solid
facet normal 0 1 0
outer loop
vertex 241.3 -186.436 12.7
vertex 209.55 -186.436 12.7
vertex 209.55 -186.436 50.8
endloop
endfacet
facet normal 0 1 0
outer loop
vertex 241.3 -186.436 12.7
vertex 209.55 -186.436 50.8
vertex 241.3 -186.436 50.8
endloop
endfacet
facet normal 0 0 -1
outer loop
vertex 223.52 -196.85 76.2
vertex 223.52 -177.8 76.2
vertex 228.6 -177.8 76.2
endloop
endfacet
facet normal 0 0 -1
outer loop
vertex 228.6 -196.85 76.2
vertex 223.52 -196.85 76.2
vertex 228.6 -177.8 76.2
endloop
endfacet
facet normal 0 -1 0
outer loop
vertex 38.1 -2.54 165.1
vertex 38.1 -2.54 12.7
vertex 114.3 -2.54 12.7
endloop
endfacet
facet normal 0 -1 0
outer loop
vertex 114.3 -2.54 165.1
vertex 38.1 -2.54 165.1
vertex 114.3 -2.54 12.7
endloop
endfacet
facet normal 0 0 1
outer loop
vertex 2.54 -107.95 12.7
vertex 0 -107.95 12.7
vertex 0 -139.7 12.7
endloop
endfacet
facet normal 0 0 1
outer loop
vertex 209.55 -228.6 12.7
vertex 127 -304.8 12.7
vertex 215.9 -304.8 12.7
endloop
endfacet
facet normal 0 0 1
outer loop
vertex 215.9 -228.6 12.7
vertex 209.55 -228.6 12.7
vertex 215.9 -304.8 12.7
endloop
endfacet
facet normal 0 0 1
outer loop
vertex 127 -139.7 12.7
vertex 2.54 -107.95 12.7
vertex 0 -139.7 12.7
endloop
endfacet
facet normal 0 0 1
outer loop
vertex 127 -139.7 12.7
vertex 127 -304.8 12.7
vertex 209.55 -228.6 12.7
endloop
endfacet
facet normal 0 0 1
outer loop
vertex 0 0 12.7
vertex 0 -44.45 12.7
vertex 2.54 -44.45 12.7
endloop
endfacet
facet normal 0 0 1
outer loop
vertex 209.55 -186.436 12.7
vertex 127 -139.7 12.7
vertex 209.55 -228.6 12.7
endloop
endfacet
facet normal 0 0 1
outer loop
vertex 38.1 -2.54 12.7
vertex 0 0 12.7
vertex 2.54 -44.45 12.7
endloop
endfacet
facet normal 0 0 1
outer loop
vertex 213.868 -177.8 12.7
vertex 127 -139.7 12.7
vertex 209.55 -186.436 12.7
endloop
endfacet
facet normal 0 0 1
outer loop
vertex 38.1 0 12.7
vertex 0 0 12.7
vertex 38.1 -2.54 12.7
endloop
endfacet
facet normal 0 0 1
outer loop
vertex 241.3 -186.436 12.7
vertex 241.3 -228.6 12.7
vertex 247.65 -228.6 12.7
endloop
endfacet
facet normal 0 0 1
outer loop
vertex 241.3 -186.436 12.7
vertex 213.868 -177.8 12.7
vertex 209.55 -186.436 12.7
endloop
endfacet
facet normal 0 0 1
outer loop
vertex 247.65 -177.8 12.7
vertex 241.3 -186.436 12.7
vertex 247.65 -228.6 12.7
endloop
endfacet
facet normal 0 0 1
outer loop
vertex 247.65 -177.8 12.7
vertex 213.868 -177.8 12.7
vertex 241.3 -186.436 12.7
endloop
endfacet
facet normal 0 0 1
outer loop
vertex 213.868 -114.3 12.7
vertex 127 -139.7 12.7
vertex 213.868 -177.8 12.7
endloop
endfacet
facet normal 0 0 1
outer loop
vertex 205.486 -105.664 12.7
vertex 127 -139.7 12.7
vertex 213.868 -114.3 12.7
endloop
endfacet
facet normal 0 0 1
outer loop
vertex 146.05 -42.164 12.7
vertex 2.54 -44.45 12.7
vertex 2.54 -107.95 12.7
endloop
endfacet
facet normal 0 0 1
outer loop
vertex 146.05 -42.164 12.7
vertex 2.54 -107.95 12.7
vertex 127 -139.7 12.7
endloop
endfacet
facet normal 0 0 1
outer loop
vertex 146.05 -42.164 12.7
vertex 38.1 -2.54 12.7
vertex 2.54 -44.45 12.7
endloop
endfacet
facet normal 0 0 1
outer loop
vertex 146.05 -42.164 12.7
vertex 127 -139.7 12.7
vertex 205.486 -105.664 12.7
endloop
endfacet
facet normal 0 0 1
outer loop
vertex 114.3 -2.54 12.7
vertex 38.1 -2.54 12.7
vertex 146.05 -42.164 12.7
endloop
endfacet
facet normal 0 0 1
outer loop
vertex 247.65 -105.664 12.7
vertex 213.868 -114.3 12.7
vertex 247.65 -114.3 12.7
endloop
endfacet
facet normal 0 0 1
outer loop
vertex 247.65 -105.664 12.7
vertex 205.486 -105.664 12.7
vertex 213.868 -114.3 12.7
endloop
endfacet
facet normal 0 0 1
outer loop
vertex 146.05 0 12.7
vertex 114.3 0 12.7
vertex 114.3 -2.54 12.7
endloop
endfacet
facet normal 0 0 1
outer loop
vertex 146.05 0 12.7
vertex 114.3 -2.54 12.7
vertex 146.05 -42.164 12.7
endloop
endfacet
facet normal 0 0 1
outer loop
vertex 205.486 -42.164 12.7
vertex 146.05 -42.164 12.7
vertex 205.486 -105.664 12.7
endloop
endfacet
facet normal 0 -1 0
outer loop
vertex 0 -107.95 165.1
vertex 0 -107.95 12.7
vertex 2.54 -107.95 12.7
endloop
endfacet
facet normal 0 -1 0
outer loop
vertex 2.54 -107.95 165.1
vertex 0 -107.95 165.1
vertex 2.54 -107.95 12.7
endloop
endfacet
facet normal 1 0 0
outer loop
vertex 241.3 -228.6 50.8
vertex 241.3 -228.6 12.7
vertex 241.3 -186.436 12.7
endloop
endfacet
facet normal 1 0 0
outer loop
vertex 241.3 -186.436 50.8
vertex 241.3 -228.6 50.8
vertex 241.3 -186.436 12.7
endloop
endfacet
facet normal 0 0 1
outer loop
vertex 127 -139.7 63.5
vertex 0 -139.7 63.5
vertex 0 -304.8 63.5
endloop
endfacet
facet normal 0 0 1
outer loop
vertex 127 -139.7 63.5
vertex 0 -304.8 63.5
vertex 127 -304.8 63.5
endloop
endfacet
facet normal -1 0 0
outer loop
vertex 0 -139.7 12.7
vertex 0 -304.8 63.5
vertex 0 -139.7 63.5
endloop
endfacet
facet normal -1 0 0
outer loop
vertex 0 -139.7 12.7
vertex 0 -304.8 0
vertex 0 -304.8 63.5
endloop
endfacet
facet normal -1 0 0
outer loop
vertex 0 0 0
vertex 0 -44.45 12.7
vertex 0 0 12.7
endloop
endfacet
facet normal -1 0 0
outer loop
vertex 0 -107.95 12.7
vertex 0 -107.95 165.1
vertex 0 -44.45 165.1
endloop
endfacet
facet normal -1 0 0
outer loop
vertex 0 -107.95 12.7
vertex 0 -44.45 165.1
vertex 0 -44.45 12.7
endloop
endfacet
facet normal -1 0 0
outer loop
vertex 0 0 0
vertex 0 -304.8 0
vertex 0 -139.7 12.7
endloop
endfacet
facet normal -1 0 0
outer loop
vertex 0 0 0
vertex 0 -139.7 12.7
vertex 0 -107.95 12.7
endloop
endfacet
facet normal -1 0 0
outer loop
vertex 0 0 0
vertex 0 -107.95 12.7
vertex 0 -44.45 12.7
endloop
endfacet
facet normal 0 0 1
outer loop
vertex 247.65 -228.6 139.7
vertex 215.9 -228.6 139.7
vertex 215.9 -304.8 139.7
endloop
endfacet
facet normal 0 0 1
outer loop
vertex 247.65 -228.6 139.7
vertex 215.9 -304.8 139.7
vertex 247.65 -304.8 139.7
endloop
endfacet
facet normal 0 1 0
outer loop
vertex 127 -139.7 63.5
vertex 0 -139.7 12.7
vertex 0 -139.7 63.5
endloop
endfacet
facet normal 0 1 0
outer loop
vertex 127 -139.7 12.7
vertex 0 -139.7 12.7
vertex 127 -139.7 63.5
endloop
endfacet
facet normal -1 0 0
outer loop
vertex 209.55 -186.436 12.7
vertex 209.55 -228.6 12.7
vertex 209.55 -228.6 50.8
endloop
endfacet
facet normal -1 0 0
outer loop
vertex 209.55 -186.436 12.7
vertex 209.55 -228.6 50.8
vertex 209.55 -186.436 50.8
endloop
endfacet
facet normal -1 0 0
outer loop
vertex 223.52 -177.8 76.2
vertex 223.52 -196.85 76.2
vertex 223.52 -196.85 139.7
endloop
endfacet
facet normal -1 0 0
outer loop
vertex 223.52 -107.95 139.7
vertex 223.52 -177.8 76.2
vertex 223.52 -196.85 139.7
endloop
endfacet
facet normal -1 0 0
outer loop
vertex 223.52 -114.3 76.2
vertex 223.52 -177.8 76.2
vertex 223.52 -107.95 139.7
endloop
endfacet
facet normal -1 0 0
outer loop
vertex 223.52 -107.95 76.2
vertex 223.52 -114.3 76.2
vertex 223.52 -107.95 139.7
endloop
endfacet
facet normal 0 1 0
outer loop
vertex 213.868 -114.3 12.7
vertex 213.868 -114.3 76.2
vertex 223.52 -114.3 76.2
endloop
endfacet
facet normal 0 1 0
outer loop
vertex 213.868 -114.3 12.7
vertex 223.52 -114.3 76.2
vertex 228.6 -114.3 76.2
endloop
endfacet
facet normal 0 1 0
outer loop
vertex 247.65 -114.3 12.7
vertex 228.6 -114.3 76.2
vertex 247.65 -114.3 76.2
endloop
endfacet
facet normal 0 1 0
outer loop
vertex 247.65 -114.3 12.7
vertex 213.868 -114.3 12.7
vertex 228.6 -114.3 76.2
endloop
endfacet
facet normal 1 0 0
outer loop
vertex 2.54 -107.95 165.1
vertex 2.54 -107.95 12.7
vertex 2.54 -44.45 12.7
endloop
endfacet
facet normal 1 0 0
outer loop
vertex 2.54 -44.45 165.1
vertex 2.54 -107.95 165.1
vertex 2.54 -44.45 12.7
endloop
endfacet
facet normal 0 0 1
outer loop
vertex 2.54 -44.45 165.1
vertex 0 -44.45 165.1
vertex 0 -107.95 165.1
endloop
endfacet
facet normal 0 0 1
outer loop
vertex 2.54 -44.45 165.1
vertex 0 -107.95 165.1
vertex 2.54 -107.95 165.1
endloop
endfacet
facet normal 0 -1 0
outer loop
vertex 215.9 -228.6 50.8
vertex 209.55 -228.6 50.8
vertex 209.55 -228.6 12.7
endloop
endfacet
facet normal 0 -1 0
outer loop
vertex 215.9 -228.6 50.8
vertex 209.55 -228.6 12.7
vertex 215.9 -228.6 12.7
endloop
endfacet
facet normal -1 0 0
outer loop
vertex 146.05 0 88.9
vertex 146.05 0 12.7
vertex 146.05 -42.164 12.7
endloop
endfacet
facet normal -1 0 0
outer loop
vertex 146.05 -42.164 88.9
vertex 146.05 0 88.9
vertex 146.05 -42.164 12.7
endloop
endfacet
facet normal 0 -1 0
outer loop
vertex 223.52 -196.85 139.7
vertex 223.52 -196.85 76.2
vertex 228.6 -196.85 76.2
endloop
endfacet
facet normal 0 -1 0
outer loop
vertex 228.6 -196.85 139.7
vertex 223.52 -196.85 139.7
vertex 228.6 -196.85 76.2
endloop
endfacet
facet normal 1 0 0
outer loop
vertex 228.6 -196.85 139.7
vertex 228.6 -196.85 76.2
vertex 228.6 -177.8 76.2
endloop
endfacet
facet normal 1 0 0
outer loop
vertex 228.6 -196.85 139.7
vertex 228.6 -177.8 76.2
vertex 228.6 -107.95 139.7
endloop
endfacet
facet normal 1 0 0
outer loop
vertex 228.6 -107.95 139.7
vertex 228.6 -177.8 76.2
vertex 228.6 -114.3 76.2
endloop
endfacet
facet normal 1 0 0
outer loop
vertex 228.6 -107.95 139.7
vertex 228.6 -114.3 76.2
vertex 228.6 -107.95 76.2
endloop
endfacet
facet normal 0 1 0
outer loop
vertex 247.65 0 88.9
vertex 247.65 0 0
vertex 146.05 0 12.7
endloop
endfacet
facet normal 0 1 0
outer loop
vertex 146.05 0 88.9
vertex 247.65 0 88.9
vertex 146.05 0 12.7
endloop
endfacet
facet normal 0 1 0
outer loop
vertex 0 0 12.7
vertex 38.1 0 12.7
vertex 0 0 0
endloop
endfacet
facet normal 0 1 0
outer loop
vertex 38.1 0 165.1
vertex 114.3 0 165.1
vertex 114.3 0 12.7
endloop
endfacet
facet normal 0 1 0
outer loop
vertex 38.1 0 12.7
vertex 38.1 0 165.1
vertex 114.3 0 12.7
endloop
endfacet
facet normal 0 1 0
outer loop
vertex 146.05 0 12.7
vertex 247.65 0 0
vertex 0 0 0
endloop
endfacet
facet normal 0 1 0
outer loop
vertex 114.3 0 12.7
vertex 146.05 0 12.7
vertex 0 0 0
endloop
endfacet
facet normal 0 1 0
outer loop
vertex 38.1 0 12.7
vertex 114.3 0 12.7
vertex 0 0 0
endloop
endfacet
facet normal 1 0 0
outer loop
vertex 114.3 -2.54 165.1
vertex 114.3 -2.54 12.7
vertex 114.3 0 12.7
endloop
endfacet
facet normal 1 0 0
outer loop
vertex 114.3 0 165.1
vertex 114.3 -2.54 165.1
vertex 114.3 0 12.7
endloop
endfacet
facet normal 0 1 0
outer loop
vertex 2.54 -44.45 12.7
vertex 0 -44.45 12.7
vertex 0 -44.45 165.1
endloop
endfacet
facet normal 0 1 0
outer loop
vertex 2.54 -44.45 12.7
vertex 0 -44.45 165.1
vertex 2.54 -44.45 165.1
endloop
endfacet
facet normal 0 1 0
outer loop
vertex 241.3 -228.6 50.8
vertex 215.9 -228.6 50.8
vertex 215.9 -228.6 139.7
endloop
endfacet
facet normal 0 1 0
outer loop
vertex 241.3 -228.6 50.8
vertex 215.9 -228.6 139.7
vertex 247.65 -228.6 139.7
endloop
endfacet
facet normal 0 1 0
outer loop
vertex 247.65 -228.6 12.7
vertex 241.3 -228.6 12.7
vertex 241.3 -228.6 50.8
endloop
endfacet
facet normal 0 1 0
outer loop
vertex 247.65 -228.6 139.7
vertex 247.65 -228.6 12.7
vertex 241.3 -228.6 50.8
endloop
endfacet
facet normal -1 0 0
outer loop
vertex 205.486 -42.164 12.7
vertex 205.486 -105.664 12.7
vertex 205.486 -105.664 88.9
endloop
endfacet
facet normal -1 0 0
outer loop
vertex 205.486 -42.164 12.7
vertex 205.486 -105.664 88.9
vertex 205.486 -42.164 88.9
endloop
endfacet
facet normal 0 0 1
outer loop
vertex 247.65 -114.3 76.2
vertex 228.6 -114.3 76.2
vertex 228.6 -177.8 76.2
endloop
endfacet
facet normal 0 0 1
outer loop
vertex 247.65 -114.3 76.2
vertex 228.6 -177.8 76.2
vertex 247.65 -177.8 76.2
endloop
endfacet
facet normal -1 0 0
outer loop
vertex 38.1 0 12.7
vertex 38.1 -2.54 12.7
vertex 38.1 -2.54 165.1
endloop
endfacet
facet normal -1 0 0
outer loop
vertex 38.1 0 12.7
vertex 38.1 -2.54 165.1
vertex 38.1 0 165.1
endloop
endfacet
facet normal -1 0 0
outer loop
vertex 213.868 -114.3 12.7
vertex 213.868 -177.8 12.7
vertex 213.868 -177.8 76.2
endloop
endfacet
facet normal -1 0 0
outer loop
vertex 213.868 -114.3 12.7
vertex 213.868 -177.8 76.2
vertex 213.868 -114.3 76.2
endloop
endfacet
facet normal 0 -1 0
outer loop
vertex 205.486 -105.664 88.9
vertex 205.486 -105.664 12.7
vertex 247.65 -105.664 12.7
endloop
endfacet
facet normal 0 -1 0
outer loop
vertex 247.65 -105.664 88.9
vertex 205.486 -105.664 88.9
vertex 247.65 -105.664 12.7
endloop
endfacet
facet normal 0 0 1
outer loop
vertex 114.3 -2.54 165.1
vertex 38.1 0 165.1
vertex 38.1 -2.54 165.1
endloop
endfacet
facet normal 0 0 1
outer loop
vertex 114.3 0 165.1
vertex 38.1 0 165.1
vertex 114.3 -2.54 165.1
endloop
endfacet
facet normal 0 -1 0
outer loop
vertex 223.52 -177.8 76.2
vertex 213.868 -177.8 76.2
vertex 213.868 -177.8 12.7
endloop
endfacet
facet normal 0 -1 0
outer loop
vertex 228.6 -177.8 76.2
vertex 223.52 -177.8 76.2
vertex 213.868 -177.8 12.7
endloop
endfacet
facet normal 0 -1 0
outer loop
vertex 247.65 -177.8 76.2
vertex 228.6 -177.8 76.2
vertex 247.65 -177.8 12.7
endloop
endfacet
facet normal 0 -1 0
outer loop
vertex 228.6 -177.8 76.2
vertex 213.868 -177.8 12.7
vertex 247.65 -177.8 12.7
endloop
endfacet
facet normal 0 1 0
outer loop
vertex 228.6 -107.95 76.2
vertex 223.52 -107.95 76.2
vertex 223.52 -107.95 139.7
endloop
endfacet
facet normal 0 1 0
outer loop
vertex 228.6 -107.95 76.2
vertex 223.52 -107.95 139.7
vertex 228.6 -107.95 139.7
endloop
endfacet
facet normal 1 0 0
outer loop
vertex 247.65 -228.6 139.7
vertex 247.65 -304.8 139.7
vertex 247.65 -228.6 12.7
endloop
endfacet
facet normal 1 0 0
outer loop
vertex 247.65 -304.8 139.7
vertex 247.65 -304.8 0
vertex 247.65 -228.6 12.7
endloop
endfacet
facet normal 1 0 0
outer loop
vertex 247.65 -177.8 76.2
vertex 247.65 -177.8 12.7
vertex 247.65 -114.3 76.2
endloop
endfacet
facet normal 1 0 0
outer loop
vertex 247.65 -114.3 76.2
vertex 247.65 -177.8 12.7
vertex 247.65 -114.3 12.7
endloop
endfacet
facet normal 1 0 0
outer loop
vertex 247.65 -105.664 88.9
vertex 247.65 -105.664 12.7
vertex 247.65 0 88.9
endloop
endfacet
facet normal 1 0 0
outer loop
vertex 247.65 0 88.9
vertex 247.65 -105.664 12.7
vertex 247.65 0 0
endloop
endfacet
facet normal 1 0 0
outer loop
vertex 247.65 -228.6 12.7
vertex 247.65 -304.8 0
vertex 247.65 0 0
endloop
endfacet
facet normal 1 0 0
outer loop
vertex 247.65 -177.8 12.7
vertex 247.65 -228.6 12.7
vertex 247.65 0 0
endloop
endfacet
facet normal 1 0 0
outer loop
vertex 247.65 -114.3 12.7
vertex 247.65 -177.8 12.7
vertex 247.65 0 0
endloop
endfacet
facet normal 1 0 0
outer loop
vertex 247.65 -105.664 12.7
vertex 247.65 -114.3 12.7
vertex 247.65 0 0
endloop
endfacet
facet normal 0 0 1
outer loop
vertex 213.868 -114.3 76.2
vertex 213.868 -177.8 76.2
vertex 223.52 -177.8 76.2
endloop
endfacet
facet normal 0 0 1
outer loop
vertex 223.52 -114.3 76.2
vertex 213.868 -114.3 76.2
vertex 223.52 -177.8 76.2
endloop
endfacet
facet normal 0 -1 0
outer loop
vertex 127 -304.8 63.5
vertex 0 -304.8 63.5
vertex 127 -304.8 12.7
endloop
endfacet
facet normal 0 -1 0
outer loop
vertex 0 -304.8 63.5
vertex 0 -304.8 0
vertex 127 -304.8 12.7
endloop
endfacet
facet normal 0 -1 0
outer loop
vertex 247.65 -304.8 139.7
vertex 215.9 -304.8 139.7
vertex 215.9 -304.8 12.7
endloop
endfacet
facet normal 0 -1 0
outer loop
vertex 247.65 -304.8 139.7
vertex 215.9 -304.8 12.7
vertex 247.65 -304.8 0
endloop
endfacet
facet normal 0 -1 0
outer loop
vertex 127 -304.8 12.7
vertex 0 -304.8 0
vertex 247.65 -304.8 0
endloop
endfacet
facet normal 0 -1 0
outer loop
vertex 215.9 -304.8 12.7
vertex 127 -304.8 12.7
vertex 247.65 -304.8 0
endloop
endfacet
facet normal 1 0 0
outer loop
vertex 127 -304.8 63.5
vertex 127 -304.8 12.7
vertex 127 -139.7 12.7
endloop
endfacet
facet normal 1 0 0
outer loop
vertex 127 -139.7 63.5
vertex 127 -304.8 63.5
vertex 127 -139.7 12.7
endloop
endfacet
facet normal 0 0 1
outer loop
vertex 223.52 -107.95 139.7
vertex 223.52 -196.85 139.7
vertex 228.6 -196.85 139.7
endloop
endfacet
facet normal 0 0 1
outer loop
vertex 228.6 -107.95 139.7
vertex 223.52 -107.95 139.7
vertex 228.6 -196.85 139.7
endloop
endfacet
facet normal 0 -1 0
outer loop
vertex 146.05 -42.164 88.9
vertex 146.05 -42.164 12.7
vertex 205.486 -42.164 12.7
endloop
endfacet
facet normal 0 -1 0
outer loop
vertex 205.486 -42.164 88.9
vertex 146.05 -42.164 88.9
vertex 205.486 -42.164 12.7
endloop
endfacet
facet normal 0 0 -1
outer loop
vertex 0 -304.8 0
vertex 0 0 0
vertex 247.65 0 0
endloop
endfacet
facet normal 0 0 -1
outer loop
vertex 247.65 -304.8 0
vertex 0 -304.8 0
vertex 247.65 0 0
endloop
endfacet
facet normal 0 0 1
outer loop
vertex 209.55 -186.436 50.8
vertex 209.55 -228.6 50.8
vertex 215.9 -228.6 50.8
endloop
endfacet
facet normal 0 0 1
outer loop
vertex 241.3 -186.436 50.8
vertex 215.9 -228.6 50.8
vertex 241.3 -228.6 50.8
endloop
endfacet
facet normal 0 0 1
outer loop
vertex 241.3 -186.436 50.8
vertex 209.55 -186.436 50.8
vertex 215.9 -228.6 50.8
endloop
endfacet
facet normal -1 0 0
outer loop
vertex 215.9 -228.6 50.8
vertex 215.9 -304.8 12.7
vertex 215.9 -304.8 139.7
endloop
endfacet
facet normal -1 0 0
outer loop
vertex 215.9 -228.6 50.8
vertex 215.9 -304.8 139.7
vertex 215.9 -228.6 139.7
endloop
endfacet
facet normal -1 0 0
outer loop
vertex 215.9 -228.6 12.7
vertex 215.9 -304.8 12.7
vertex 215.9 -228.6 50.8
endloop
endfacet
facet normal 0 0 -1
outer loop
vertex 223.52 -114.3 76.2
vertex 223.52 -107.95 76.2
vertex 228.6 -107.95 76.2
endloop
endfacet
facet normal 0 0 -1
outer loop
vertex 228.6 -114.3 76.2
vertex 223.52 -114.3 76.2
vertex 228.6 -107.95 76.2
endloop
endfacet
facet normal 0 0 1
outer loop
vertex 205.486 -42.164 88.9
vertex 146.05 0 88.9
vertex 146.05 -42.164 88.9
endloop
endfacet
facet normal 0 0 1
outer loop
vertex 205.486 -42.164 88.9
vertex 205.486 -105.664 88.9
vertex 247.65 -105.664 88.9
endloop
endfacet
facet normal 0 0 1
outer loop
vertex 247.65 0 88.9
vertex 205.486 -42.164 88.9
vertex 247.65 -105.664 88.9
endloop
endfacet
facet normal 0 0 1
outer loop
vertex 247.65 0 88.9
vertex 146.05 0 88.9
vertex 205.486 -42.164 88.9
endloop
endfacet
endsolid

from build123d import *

# Parameters (mm, degrees)
F0_W      = 247.65
F0_H      = 304.8
F1_DEPTH  = 12.7
F2_W      = 2.54
F2_H      = 63.5
F3_DEPTH  = 152.4
F4_W      = 76.2
F4_H      = 2.54
F5_DEPTH  = 152.4
F6_W      = 42.164
F6_H      = 63.5
F7_DEPTH  = 76.2
F8_W      = 33.782
F8_H      = 63.5
F9_DEPTH  = 63.5
F10_W     = 5.08
F10_H     = 88.9
F11_DEPTH = 63.5
F12_W     = 31.75
F12_H     = 76.2
F13_DEPTH = 127
F14_W     = 31.75
F14_H     = 42.164
F15_DEPTH = 38.1
F16_W     = 127
F16_H     = 165.1
F17_DEPTH = 50.8


with BuildPart() as f1:
    # F0 (on Top) → F1 (new body)
    with BuildSketch(Plane.XY):
        with Locations((123.825, -152.4)):
            Rectangle(F0_W, F0_H)
    extrude(amount=F1_DEPTH)

    # F2 (on face) → F3 (join)
    with BuildSketch(Plane.XY.offset(12.7)):
        with Locations((1.27, -76.2)):
            Rectangle(F2_W, F2_H)
    extrude(amount=F3_DEPTH)

    # F4 (on face) → F5 (join)
    with BuildSketch(Plane.XY.offset(12.7)):
        with Locations((76.2, -1.27)):
            Rectangle(F4_W, F4_H)
    extrude(amount=F5_DEPTH)

    # F6 (on face) → F7 (join)
    with BuildSketch(Plane.XY.offset(12.7)):
        Polygon((247.65, -42.164), (247.65, 0), (146.05, 0), (146.05, -42.164), (205.486, -42.164), align=None)
        with Locations((226.568, -73.914)):
            Rectangle(F6_W, F6_H)
    extrude(amount=F7_DEPTH)

    # F8 (on face) → F9 (join)
    with BuildSketch(Plane.XY.offset(12.7)):
        with Locations((230.759, -146.05)):
            Rectangle(F8_W, F8_H)
    extrude(amount=F9_DEPTH)

    # F10 (on face) → F11 (join)
    with BuildSketch(Plane.XY.offset(76.2)):
        with Locations((226.06, -152.4)):
            Rectangle(F10_W, F10_H)
    extrude(amount=F11_DEPTH)

    # F12 (on face) → F13 (join)
    with BuildSketch(Plane.XY.offset(12.7)):
        with Locations((231.775, -266.7)):
            Rectangle(F12_W, F12_H)
    extrude(amount=F13_DEPTH)

    # F14 (on face) → F15 (join)
    with BuildSketch(Plane.XY.offset(12.7)):
        with Locations((225.425, -207.518)):
            Rectangle(F14_W, F14_H)
    extrude(amount=F15_DEPTH)

    # F16 (on face) → F17 (join)
    with BuildSketch(Plane.XY.offset(12.7)):
        with Locations((63.5, -222.25)):
            Rectangle(F16_W, F16_H)
    extrude(amount=F17_DEPTH)


solid = f1.part
